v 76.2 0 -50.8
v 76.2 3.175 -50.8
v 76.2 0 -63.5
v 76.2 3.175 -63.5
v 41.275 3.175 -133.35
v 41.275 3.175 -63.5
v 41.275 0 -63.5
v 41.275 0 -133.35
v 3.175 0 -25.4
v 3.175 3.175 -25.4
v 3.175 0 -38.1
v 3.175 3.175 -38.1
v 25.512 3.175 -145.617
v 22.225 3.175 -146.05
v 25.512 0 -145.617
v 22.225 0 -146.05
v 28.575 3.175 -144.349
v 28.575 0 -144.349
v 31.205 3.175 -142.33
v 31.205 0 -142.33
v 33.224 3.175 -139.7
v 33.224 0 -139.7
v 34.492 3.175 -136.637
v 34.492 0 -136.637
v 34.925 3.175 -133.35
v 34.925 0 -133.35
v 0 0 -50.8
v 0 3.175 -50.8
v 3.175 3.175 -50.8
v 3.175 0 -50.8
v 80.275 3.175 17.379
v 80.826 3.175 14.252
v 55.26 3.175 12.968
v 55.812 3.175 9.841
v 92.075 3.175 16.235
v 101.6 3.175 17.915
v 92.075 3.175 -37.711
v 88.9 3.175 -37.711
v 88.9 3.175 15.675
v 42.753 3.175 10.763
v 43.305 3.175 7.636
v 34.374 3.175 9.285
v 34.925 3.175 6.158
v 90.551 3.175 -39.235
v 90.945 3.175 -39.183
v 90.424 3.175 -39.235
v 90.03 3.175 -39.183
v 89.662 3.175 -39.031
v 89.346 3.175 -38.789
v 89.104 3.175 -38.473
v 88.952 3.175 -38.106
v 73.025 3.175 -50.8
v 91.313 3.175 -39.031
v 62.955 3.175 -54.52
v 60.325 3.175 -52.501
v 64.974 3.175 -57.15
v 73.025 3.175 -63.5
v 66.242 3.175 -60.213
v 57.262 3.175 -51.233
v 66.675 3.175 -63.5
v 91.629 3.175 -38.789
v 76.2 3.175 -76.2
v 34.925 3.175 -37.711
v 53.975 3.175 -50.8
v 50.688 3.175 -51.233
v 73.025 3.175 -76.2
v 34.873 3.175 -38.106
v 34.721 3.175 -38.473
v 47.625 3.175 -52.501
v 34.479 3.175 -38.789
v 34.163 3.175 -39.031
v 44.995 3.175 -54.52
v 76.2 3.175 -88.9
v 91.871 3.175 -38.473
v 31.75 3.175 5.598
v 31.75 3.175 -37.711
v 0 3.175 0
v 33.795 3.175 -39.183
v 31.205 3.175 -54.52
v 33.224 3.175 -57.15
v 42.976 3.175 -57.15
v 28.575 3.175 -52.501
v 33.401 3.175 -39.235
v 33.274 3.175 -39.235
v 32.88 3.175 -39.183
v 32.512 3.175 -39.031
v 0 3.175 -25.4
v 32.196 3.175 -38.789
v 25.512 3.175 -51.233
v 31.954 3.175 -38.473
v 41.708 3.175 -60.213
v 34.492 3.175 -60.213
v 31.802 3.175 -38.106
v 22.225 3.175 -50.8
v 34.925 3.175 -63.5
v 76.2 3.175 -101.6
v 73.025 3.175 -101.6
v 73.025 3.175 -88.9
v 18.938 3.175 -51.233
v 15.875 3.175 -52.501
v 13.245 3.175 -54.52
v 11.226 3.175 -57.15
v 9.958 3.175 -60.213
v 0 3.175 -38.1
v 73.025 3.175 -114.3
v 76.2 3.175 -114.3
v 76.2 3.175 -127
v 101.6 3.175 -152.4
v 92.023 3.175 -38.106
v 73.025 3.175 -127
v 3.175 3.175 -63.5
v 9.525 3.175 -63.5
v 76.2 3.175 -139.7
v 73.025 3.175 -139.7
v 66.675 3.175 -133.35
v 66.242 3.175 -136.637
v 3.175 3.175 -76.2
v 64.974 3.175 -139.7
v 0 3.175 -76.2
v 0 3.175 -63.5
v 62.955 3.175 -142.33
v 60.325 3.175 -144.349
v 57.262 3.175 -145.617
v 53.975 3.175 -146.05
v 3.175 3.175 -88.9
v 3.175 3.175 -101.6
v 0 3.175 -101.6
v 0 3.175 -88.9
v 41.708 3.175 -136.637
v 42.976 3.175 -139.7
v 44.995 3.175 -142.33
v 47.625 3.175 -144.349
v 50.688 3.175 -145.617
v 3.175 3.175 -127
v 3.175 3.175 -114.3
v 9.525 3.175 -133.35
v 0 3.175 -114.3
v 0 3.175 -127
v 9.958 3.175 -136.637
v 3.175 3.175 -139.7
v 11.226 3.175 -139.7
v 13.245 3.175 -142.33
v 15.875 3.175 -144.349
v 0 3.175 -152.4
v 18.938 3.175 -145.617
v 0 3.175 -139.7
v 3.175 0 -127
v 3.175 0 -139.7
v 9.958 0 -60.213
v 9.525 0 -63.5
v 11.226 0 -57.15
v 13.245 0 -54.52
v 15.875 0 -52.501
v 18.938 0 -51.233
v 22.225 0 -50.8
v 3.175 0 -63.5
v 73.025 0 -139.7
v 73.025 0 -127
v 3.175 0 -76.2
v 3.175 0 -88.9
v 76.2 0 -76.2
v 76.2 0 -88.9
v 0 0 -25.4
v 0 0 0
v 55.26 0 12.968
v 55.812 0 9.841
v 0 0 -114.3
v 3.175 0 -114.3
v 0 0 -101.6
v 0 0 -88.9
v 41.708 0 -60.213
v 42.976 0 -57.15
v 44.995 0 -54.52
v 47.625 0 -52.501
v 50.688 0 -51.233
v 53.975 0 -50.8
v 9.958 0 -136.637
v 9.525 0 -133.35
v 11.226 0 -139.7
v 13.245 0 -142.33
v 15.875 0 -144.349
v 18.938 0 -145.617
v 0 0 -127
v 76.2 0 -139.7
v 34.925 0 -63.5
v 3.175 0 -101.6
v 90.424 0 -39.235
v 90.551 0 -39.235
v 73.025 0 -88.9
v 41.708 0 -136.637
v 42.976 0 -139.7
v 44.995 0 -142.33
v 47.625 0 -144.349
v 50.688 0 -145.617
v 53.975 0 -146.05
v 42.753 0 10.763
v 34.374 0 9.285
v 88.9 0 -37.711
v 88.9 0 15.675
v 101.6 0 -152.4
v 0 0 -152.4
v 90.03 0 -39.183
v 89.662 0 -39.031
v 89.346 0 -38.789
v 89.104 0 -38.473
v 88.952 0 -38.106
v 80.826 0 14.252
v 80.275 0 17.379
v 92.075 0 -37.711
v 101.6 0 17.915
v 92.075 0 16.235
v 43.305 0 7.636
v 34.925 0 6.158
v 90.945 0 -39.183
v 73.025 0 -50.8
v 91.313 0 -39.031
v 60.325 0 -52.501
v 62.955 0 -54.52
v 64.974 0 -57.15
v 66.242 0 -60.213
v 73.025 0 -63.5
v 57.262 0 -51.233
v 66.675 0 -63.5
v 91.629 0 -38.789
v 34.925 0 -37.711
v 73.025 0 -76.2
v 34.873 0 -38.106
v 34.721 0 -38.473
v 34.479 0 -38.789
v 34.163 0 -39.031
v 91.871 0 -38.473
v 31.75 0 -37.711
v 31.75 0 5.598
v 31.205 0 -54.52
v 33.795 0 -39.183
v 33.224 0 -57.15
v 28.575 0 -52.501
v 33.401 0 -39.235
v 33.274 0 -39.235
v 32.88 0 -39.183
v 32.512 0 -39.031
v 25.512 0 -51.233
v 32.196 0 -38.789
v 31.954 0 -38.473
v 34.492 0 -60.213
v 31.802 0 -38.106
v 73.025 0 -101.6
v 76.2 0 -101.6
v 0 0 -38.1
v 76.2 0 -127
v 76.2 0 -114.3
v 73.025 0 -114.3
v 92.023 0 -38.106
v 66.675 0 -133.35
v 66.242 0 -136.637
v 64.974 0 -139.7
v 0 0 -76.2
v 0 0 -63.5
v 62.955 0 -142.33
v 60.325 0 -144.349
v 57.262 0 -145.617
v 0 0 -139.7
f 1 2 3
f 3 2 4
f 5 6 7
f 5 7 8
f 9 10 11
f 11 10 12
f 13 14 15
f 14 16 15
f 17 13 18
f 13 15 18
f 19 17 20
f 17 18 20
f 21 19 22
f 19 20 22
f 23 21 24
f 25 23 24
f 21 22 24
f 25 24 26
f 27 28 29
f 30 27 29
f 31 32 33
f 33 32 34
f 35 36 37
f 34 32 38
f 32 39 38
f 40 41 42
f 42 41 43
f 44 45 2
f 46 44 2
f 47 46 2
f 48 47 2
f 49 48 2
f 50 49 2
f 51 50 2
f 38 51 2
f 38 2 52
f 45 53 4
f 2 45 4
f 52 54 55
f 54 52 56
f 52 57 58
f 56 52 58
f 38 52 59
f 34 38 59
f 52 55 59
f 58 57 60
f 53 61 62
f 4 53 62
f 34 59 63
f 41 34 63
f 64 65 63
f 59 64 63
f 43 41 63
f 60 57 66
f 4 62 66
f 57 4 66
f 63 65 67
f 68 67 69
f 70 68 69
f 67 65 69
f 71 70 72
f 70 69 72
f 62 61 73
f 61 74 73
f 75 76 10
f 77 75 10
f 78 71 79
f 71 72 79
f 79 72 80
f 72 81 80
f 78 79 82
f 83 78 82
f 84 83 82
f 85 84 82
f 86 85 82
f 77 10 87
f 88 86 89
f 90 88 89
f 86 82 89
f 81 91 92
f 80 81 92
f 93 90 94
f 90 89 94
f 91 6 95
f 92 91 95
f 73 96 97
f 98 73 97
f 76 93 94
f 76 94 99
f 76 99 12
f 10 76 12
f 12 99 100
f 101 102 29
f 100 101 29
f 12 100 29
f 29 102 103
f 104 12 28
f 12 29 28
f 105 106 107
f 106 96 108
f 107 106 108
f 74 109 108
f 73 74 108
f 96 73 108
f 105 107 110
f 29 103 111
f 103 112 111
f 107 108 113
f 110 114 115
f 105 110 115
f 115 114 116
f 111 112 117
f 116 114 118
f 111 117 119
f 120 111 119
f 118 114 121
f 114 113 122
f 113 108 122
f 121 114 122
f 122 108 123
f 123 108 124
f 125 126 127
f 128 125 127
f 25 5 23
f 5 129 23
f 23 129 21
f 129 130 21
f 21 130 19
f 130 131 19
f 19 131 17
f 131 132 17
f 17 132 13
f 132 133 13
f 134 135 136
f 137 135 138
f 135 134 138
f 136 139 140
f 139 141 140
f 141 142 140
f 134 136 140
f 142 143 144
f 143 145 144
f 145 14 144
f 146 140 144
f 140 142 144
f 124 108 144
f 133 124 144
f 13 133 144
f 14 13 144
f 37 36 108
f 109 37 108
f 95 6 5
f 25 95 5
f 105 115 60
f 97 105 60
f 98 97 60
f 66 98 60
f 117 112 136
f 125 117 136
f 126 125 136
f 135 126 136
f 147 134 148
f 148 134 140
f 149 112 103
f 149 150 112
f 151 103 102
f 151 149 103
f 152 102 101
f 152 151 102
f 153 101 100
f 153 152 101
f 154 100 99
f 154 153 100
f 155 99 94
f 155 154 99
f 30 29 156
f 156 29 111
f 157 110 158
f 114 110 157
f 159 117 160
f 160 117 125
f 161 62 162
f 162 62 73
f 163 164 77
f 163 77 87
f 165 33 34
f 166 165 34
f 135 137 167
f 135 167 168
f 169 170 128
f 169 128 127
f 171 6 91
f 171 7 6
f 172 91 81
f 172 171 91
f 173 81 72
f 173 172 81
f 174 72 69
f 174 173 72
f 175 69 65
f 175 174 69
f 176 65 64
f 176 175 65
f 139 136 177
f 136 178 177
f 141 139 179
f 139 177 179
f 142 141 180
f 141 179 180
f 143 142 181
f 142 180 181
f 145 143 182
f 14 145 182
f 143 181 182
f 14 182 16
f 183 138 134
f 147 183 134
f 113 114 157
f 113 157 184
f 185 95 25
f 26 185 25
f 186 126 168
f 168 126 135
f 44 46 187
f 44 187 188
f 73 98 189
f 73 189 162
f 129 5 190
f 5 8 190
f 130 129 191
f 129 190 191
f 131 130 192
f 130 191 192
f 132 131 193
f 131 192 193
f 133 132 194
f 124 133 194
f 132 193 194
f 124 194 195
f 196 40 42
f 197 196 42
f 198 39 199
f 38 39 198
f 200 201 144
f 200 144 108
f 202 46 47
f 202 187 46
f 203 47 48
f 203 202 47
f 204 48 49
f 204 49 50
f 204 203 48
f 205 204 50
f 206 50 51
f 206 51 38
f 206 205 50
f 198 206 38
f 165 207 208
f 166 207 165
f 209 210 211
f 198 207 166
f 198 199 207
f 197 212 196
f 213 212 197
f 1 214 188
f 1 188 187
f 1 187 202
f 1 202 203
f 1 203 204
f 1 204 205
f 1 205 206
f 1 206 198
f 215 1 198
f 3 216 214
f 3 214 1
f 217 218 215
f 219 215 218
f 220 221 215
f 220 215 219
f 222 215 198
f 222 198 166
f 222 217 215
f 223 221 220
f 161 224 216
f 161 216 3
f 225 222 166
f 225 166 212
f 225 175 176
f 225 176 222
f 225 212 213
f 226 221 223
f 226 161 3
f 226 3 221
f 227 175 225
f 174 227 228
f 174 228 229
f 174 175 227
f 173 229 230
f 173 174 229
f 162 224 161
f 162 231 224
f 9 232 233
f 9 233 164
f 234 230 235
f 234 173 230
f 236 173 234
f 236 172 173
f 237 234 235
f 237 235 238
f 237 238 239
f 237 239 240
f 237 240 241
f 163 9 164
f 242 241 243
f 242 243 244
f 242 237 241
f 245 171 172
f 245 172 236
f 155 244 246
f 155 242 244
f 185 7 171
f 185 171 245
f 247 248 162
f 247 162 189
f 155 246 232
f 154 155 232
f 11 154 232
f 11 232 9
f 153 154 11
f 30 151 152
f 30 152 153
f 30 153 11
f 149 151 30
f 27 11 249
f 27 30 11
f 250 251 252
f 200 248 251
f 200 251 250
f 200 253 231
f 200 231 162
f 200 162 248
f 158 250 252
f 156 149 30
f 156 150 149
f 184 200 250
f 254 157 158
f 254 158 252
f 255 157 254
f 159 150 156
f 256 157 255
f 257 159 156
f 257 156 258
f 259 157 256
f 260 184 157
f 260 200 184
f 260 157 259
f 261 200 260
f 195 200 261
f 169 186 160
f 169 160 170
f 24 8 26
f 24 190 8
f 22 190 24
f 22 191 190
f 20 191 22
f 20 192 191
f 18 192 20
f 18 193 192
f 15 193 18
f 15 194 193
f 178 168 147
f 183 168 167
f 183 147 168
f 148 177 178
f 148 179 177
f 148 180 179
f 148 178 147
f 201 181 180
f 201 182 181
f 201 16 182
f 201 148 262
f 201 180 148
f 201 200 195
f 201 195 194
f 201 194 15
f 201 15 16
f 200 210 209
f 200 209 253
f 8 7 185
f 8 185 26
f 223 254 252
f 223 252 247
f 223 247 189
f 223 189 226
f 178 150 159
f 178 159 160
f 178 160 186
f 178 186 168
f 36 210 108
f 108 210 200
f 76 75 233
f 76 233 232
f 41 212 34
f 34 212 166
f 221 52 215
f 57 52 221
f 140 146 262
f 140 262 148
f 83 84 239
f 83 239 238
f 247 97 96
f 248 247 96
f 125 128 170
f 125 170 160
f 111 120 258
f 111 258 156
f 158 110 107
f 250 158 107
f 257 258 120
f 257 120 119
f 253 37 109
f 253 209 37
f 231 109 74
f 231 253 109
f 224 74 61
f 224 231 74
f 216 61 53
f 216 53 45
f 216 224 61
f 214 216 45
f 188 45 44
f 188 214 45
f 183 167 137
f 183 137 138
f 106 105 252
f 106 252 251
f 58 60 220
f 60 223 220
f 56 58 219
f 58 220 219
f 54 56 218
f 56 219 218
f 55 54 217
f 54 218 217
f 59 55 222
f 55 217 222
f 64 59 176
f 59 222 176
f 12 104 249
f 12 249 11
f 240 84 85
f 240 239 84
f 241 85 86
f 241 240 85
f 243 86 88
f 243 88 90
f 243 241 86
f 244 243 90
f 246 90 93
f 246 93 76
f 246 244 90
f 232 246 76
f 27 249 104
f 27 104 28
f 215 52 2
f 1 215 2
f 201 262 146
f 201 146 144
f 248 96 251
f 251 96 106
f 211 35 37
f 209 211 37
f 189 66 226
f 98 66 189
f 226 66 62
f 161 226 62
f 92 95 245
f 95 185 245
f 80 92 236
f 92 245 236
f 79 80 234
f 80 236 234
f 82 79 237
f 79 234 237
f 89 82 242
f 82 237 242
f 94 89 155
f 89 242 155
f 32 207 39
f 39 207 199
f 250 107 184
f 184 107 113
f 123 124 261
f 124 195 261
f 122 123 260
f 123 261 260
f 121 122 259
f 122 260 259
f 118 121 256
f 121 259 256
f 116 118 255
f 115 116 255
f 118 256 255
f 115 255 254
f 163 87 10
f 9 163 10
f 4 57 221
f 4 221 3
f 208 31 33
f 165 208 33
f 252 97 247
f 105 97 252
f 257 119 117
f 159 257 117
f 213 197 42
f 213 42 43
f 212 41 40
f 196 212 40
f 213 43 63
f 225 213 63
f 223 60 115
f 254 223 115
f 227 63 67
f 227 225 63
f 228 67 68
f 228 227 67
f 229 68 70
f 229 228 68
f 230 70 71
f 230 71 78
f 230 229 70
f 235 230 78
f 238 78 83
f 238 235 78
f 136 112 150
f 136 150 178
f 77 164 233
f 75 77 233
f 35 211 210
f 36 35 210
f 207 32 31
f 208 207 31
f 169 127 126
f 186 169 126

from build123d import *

# Parameters (mm, degrees)
SKETCH1_W           = 101.6
SKETCH1_H           = 152.4
BOSS_EXTRUDE1_DEPTH = 3.175
SKETCH2_W           = 3.175
SKETCH2_H           = 12.7
CUT_EXTRUDE1_DEPTH  = 3.175
LPATTERN1_COUNT     = 5
LPATTERN1_PITCH     = 25.4
SKETCH3_W           = 3.175
SKETCH3_H           = 12.7
CUT_EXTRUDE2_DEPTH  = 3.175
LPATTERN2_COUNT     = 4
LPATTERN2_PITCH     = 25.4
SKETCH5_W           = 3.175
SKETCH5_H           = 57.15
CUT_EXTRUDE3_DEPTH  = 3.175
FILLET1_R           = 1.524
BOSS_EXTRUDE2_DEPTH = 3.175
SKETCH7_W           = 25.4
SKETCH7_H           = 95.25
CUT_EXTRUDE4_DEPTH  = 3.175
FILLET2_R           = 12.7


with BuildPart() as part:
    # Sketch1 → Boss-Extrude1 (new body)
    with BuildSketch(Plane(origin=(0, 0, 0), x_dir=(1, 0, 0), z_dir=(0, 1, 0))):
        with Locations((50.8, 76.2)):
            Rectangle(SKETCH1_W, SKETCH1_H)
        Polygon((0, 0), (101.6, -17.91482124), (101.6, 0), align=None)
    extrude(amount=BOSS_EXTRUDE1_DEPTH)

    # Sketch2 → Cut-Extrude1 (cut)
    with BuildSketch(Plane(origin=(0, 3.175, 0), x_dir=(1, 0, 0), z_dir=(0, 1, 0))):
        with Locations((1.5875, 133.35)):
            Rectangle(SKETCH2_W, SKETCH2_H)
    cut_extrude1 = extrude(amount=-CUT_EXTRUDE1_DEPTH, mode=Mode.SUBTRACT)

    # LPattern1: Cut-Extrude1 ×5
    with Locations(*[(0, 0, i * LPATTERN1_PITCH) for i in range(1, LPATTERN1_COUNT)]):
        add(cut_extrude1, mode=Mode.SUBTRACT)

    # Sketch3 → Cut-Extrude2 (cut)
    with BuildSketch(Plane(origin=(0, 3.175, 0), x_dir=(1, 0, 0), z_dir=(0, 1, 0))):
        with Locations((74.6125, 133.35)):
            Rectangle(SKETCH3_W, SKETCH3_H)
    cut_extrude2 = extrude(amount=-CUT_EXTRUDE2_DEPTH, mode=Mode.SUBTRACT)

    # LPattern2: Cut-Extrude2 ×4
    with Locations(*[(0, 0, i * LPATTERN2_PITCH) for i in range(1, LPATTERN2_COUNT)]):
        add(cut_extrude2, mode=Mode.SUBTRACT)

    # Sketch5 → Cut-Extrude3 (cut)
    with BuildSketch(Plane(origin=(0, 3.175, 0), x_dir=(1, 0, 0), z_dir=(0, 1, 0))):
        with Locations((33.3375, 10.66017876)):
            Rectangle(SKETCH5_W, SKETCH5_H)
        with Locations((90.4875, 10.66017876)):
            Rectangle(SKETCH5_W, SKETCH5_H)
    extrude(amount=-CUT_EXTRUDE3_DEPTH, mode=Mode.SUBTRACT)

    # Fillet1
    fillet1_edges = [part.edges().sort_by_distance(p)[0] for p in [
        (34.925, 1.5875, -39.23517876),
        (31.75, 1.5875, -39.23517876),
        (92.075, 1.5875, -39.23517876),
        (88.9, 1.5875, -39.23517876),
    ]]
    fillet(fillet1_edges, radius=FILLET1_R)

    # Sketch6 → Boss-Extrude2 (add)
    with BuildSketch(Plane(origin=(0, 3.175, 0), x_dir=(1, 0, 0), z_dir=(0, 1, 0))):
        Polygon((34.925, -6.158219801), (43.30472917, -7.635792145), (42.753396206, -10.762556761), (34.373667036, -9.284984417), align=None)
        Polygon((55.811787634, -9.841124001), (80.82590456, -14.251787714), (80.274571596, -17.37855233), (55.26045467, -12.967888617), align=None)
    extrude(amount=-BOSS_EXTRUDE2_DEPTH)

    # Sketch7 → Cut-Extrude4 (cut)
    with BuildSketch(Plane(origin=(0, 3.175, 0), x_dir=(1, 0, 0), z_dir=(0, 1, 0))):
        with Locations((22.225, 98.425)):
            Rectangle(SKETCH7_W, SKETCH7_H)
        with Locations((53.975, 98.425)):
            Rectangle(SKETCH7_W, SKETCH7_H)
    extrude(amount=-CUT_EXTRUDE4_DEPTH, mode=Mode.SUBTRACT)

    # Fillet2
    fillet2_edges = [part.edges().sort_by_distance(p)[0] for p in [
        (66.675, 1.5875, -146.05),
        (34.925, 1.5875, -146.05),
        (41.275, 1.5875, -146.05),
        (9.525, 1.5875, -146.05),
        (34.925, 1.5875, -50.8),
        (41.275, 1.5875, -50.8),
        (66.675, 1.5875, -50.8),
        (9.525, 1.5875, -50.8),
    ]]
    fillet(fillet2_edges, radius=FILLET2_R - 0.0001)  # a hair under: the kernel refuses the full size


solid = part.part
